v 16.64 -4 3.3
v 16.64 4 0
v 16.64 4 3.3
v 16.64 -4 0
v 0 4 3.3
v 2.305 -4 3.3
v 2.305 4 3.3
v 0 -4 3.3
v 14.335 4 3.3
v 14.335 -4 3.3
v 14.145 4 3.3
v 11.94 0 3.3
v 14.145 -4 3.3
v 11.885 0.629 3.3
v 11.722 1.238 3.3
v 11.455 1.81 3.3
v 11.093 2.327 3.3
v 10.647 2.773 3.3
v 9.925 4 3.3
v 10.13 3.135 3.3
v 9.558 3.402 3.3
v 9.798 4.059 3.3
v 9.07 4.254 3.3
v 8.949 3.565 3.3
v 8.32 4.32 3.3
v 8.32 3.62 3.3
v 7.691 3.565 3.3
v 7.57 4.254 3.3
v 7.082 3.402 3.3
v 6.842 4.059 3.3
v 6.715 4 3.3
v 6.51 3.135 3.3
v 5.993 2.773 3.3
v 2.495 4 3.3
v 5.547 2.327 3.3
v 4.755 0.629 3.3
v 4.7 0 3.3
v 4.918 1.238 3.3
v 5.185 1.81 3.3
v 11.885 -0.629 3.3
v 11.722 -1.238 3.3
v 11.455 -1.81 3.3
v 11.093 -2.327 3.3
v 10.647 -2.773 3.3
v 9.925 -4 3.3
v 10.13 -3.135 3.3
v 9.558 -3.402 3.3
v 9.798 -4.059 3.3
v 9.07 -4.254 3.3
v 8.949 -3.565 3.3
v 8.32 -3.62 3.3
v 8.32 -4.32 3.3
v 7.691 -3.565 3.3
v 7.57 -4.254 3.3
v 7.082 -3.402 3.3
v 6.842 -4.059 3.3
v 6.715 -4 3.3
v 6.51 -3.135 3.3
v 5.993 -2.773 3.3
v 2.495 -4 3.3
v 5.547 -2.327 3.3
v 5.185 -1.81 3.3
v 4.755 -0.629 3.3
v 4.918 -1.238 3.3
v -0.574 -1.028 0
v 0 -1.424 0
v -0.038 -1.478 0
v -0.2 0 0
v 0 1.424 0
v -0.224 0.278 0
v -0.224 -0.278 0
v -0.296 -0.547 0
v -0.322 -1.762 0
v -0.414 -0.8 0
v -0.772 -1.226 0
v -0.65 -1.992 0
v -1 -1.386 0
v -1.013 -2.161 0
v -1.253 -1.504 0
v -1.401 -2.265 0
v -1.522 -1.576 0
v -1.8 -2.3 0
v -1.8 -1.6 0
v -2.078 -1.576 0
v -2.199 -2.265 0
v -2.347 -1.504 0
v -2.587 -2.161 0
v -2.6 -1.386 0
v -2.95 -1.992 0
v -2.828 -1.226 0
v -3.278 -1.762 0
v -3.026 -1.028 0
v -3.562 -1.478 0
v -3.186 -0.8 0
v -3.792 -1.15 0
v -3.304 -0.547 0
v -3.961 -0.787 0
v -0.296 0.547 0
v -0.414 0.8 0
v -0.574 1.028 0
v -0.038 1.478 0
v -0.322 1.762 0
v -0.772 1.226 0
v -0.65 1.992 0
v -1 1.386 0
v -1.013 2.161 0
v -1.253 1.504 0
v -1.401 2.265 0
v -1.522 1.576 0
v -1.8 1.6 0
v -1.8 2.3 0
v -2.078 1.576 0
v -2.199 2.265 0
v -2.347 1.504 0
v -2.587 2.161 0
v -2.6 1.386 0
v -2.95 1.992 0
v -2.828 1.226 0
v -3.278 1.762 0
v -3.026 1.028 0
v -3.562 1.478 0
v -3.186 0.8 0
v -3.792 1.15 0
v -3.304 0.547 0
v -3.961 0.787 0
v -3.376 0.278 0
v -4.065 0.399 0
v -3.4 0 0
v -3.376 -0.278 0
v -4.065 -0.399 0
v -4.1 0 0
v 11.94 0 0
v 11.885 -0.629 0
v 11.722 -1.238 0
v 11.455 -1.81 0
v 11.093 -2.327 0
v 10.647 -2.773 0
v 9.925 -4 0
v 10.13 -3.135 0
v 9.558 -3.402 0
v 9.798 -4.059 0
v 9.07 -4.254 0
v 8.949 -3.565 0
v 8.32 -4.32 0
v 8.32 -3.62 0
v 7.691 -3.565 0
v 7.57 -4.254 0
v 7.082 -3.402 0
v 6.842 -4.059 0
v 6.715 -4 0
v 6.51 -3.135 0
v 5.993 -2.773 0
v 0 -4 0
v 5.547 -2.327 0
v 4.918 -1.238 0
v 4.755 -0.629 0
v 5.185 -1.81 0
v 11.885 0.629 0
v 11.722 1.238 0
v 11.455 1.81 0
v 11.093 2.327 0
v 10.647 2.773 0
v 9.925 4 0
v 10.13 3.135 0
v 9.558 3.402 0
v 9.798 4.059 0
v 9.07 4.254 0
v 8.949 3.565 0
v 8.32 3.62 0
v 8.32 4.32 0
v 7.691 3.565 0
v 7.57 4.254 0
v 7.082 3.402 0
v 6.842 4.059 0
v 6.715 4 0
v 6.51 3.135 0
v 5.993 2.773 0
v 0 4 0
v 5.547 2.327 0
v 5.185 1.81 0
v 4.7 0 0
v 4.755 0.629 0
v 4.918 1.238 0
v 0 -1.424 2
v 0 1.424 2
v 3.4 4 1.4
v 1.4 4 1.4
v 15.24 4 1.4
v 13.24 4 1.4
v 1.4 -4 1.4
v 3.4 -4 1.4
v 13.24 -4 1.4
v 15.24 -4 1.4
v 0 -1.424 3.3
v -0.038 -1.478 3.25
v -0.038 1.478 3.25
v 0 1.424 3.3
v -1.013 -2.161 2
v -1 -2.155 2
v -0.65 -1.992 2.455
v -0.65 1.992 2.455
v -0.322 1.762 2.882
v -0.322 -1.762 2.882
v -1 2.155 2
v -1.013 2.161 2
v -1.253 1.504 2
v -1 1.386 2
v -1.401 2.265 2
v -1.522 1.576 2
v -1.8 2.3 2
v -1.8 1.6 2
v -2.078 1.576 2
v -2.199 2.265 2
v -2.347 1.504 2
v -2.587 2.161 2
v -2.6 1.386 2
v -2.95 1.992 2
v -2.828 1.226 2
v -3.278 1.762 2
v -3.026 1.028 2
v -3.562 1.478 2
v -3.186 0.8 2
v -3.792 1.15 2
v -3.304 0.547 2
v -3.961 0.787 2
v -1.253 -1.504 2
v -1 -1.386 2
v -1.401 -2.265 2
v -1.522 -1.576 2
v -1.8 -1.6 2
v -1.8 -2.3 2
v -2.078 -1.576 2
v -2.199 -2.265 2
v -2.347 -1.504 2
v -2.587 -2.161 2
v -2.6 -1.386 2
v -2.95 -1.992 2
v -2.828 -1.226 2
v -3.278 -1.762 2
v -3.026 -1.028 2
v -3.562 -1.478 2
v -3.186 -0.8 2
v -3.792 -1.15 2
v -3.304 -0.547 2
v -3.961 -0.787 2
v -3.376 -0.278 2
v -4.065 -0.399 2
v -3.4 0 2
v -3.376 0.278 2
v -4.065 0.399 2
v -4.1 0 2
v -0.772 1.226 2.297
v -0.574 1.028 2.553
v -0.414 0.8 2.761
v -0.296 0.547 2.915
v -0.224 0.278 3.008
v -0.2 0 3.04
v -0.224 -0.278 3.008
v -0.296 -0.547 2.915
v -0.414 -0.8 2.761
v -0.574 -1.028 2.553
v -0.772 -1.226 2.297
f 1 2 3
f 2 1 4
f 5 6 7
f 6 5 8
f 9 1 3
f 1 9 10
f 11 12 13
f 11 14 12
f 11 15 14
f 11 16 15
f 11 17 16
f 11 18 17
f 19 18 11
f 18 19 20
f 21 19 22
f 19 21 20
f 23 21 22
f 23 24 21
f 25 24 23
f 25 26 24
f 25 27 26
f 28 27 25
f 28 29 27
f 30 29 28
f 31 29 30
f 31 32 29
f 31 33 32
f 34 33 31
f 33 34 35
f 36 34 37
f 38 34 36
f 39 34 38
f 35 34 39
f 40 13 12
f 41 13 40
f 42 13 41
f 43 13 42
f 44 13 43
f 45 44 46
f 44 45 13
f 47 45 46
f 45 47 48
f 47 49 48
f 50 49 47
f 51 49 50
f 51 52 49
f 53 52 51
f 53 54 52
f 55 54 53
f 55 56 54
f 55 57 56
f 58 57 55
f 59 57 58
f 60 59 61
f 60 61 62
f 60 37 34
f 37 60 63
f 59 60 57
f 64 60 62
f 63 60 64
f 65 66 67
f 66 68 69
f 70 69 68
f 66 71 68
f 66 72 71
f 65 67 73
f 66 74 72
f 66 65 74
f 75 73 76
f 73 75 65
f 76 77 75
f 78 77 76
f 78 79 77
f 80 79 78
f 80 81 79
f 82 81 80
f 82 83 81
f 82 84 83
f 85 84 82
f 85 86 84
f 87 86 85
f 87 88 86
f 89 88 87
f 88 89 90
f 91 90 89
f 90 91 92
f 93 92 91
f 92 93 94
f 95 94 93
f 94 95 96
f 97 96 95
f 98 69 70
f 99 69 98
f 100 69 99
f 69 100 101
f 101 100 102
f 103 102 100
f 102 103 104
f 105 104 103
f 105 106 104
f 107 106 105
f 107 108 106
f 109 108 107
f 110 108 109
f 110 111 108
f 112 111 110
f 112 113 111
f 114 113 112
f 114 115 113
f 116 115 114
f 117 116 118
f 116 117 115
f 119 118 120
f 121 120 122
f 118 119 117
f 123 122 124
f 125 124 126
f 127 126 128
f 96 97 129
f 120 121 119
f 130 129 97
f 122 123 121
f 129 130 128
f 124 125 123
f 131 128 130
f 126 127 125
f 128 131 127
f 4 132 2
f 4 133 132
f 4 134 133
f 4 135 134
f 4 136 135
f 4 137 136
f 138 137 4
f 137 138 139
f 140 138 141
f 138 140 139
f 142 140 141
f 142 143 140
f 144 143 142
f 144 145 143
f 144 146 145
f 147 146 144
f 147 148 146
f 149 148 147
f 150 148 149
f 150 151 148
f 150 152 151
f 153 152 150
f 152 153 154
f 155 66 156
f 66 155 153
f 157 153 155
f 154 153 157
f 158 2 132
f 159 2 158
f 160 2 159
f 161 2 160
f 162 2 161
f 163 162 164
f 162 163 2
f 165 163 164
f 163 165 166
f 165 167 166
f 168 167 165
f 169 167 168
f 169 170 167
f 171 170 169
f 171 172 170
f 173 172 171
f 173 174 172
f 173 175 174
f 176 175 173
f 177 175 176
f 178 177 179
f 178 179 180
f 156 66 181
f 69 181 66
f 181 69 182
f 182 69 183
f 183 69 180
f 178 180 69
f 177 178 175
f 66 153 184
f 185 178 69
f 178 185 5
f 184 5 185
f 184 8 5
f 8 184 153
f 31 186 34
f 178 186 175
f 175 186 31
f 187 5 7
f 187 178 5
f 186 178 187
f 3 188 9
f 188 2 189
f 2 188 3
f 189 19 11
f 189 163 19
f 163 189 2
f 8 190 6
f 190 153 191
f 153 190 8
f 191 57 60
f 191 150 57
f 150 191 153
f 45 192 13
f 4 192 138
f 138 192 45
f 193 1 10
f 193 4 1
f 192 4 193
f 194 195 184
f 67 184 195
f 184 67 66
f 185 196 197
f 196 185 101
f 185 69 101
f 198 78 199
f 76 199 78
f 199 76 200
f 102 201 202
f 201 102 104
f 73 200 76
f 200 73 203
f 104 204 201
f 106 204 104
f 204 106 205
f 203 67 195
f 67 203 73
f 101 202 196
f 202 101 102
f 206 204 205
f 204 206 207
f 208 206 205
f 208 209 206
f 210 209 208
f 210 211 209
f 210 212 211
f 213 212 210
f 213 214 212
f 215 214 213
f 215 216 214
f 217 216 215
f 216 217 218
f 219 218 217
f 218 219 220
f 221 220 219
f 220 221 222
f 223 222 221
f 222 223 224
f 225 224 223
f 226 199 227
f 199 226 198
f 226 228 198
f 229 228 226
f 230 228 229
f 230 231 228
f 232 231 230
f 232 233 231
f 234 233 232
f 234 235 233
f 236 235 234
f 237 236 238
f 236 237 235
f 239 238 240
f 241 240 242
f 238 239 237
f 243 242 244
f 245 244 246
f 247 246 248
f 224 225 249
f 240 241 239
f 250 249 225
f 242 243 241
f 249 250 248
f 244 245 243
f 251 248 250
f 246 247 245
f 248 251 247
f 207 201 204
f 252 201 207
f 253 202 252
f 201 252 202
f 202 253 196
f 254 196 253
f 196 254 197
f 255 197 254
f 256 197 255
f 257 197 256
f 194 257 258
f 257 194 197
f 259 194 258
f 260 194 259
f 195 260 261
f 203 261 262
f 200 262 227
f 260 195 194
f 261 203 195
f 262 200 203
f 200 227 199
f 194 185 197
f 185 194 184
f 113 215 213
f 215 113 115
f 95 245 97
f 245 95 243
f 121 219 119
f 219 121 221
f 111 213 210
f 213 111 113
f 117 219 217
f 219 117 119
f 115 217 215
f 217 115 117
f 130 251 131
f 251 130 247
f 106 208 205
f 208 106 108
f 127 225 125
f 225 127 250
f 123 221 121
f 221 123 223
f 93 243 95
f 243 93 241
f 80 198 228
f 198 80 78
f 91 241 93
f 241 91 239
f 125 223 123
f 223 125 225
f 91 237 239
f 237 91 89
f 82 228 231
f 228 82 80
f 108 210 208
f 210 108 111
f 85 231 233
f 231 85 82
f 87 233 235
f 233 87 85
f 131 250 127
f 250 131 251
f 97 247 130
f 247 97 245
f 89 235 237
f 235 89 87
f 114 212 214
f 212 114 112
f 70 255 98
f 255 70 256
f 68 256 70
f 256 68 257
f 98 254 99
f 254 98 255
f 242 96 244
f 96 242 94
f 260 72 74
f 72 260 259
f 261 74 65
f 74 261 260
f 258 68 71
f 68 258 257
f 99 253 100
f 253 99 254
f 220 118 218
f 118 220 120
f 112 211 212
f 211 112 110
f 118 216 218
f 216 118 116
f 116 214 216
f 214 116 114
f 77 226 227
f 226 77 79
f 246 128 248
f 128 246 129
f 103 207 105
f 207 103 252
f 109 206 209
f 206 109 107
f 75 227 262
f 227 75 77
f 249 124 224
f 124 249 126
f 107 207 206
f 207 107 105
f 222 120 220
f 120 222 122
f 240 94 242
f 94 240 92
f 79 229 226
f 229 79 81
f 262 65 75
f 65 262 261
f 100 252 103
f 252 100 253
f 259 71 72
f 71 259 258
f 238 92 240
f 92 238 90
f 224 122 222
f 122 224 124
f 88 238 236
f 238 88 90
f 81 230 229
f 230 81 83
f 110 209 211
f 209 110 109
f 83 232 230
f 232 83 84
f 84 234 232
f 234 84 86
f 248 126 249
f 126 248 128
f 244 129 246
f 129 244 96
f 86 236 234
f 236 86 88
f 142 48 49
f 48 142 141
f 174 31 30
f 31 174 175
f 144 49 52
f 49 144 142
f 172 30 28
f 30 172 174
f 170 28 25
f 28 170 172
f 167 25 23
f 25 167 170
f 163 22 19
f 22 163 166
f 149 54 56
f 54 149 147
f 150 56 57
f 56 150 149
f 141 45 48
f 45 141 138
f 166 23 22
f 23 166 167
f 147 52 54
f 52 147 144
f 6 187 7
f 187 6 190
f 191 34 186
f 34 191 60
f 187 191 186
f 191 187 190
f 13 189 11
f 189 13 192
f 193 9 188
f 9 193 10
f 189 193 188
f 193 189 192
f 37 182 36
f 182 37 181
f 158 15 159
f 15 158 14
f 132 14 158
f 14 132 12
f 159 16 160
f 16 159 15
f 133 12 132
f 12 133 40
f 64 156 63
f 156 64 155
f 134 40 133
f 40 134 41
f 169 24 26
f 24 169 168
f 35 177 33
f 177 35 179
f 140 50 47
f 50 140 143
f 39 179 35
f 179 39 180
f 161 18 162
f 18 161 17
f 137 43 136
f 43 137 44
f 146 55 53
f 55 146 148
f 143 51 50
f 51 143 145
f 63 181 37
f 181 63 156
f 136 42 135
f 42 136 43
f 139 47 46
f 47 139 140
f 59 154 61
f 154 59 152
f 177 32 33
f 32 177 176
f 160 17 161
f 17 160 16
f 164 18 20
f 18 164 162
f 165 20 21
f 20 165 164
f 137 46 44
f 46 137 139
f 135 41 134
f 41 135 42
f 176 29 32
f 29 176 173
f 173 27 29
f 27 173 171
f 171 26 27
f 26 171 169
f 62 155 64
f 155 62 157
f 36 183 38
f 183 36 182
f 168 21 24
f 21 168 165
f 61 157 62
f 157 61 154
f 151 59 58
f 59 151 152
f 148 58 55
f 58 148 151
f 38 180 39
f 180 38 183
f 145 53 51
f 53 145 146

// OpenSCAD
// Customizable Simple Macro Lens Holder 
//
// Default parameters are for the lens:
//      Size: 7 x 3.3 mm
//      BFL : 6.47 mm
//      ELF : 8.0 mm
//
//  2016.05.18 by gsyan
//
//  update : 2016.05.22
//

//preview[view:south west, tilt:top diagonal];

/* [Parameters] */

//Default parameters are for the lens : Size: 7 x 3.3 mm , BFL : 6.47 mm , ELF : 8.0 mm
lens_diameter = 7.04;

lens_height = 3.3;

//Increase this value you can plug more than 1 lens
lens_total = 1;

//Lens distance adapt for lens_total > 1
lens_distance = 0;

lens_holder_wall_thickness = 1.6;

//
keychain_ring = "true"; //[true:enabled,false:disabled]


rubber_band_holder_shape = "prism"; //[cylinder:cylinder, prism:prism]
rubber_band_holder_height = 2;
rubber_band_holder_width = 8;


keychain_ring_outer_diameter = 4.6;
keychain_ring_inner_diameter = 3.2;
keychain_ring_height = 2;

/* [Hidden] */
fn = 36;
base_rounded_radius = 0; //0.8;
keychain_offset = 0.5;
lens_holder_support_size = 2.4;

module prism(l, w, h){
    polyhedron(
        points=[[0,0,0], [l,0,0], [l,w,0], [0,w,0], [0,w,h], [l,w,h]],
        faces=[[0,1,2,3],[5,4,3,2],[0,4,5,1],[0,3,4],[5,2,1]]
               );
}

module lens_holder_support() {
    resize([lens_holder_support_size+lens_diameter+lens_holder_wall_thickness/2,lens_diameter+lens_holder_wall_thickness,lens_height/2])   
        cylinder(h=lens_height/2,d1=lens_holder_support_size+lens_diameter+lens_holder_wall_thickness/2,d2=lens_diameter+lens_holder_wall_thickness/2,$fn=8);
}

module ring_support() {
    difference() {
        translate([keychain_ring_outer_diameter/2-1-keychain_offset,keychain_ring_outer_diameter/2,0]) 
            rotate([0,0, -90]) 
                prism(keychain_ring_outer_diameter,1,lens_height-keychain_ring_height);
        
        difference() {
            translate([keychain_ring_outer_diameter/-2,keychain_ring_outer_diameter/-2-0.1,-0.1]) 
                cube([ keychain_ring_outer_diameter-keychain_offset+0.01,keychain_ring_outer_diameter+0.2, lens_height-keychain_ring_height+0.2]);
            translate([0,0, -0.1])            cylinder(h=keychain_ring_height+0.2, r=keychain_ring_outer_diameter/2, $fn=36);
        }
        
    }
}

module rubber_band_holder_cylinder() {
    union() {
        rotate(a=[90,0,0]) 
            cylinder(h=rubber_band_holder_width+1, d=rubber_band_holder_height, $fn=36);

        translate([0,(rubber_band_holder_width+1)*-1, rubber_band_holder_height/2-0.1]) 
            cube([0.1, rubber_band_holder_width+1,1]);
    }
}

module rubber_band_holder_prism() {
    resize([rubber_band_holder_height, rubber_band_holder_width+0.2, rubber_band_holder_height+0.1]) rotate([135,0,90]) prism(10, 10, 10);
}
module ring() {
    difference() {
        union() {
            cylinder(h=keychain_ring_height, r=keychain_ring_outer_diameter/2, $fn=36);
            translate([0,0,keychain_ring_height]) ring_support();
        }
        translate([0,0,-10]) cylinder(h=keychain_ring_height+20, r=keychain_ring_inner_diameter/2, $fn=36);
    }
}

module rounded(size, r) {
    //2 cube + 4 cylinder
    fn = 18;
    union() {
        translate([r, 0, 0]) cube([size[0]-2*r, size[1], size[2]]);
        translate([0, r, 0]) cube([size[0], size[1]-2*r, size[2]]);
        
        translate([r, r, 0]) cylinder(h=size[2], r=r, $fn=fn);
        translate([size[0]-r, r, 0]) cylinder(h=size[2], r=r, $fn=fn);
        translate([r, size[1]-r, 0]) cylinder(h=size[2], r=r, $fn=fn);
        translate([size[0]-r, size[1]-r, 0]) cylinder(h=size[2], r=r, $fn=fn);
    }
}

module base() {        
    union() {
        //base : cube
        translate([0, rubber_band_holder_width/-2, 0]) 
        rounded([lens_diameter+lens_holder_wall_thickness+rubber_band_holder_height*4,rubber_band_holder_width, lens_height],base_rounded_radius);
    
        //base : cylinder    
        translate([(lens_diameter+lens_holder_wall_thickness+rubber_band_holder_height*4)/2, 0, 0])
        cylinder(h=lens_height*lens_total+lens_distance*(lens_total-1), r=(lens_diameter+lens_holder_wall_thickness)/2, $fn=fn);
        
        //lens holder support
        if(lens_total > 1) translate([(lens_diameter+lens_holder_wall_thickness+rubber_band_holder_height*4)/2, 0, lens_height])
        lens_holder_support();
        
        //keychain ring
        if(keychain_ring == "true") translate([keychain_offset-keychain_ring_outer_diameter/2,0])       ring();
    }
}
module holder() {
    difference() {
        base();
        
        //lens hole
        translate([(lens_diameter+lens_holder_wall_thickness+rubber_band_holder_height*4)/2, 0, -0.1])
        cylinder(h=lens_height*lens_total+lens_distance*(lens_total-1)+1, r=(lens_diameter+0.2)/2, $fn=fn);
        
        //Ruber Band Holder hole
        
        if( rubber_band_holder_shape == "cylinder") {

        
        //left rubber band hole
        translate([rubber_band_holder_height+0.4, (rubber_band_holder_width+1)/2,lens_height-rubber_band_holder_height/2])
            rubber_band_holder_cylinder();
            
        //right rubber band hole
        translate([lens_diameter+lens_holder_wall_thickness+rubber_band_holder_height*3-0.4, (rubber_band_holder_width+1)/2,lens_height-rubber_band_holder_height/2])
            rubber_band_holder_cylinder();     
        } 
        else {
            
        //left rubber band hole
        translate([rubber_band_holder_width/8+0.4,rubber_band_holder_width/-2-0.1,lens_height+0.1-rubber_band_holder_height])         
        rubber_band_holder_prism();

        //right rubber band hole
        translate([lens_diameter+lens_holder_wall_thickness+rubber_band_holder_height*2.5-0.4,rubber_band_holder_width/-2-0.1,lens_height+0.1-
        rubber_band_holder_height]) rubber_band_holder_prism();
        }

    }
}

holder();
